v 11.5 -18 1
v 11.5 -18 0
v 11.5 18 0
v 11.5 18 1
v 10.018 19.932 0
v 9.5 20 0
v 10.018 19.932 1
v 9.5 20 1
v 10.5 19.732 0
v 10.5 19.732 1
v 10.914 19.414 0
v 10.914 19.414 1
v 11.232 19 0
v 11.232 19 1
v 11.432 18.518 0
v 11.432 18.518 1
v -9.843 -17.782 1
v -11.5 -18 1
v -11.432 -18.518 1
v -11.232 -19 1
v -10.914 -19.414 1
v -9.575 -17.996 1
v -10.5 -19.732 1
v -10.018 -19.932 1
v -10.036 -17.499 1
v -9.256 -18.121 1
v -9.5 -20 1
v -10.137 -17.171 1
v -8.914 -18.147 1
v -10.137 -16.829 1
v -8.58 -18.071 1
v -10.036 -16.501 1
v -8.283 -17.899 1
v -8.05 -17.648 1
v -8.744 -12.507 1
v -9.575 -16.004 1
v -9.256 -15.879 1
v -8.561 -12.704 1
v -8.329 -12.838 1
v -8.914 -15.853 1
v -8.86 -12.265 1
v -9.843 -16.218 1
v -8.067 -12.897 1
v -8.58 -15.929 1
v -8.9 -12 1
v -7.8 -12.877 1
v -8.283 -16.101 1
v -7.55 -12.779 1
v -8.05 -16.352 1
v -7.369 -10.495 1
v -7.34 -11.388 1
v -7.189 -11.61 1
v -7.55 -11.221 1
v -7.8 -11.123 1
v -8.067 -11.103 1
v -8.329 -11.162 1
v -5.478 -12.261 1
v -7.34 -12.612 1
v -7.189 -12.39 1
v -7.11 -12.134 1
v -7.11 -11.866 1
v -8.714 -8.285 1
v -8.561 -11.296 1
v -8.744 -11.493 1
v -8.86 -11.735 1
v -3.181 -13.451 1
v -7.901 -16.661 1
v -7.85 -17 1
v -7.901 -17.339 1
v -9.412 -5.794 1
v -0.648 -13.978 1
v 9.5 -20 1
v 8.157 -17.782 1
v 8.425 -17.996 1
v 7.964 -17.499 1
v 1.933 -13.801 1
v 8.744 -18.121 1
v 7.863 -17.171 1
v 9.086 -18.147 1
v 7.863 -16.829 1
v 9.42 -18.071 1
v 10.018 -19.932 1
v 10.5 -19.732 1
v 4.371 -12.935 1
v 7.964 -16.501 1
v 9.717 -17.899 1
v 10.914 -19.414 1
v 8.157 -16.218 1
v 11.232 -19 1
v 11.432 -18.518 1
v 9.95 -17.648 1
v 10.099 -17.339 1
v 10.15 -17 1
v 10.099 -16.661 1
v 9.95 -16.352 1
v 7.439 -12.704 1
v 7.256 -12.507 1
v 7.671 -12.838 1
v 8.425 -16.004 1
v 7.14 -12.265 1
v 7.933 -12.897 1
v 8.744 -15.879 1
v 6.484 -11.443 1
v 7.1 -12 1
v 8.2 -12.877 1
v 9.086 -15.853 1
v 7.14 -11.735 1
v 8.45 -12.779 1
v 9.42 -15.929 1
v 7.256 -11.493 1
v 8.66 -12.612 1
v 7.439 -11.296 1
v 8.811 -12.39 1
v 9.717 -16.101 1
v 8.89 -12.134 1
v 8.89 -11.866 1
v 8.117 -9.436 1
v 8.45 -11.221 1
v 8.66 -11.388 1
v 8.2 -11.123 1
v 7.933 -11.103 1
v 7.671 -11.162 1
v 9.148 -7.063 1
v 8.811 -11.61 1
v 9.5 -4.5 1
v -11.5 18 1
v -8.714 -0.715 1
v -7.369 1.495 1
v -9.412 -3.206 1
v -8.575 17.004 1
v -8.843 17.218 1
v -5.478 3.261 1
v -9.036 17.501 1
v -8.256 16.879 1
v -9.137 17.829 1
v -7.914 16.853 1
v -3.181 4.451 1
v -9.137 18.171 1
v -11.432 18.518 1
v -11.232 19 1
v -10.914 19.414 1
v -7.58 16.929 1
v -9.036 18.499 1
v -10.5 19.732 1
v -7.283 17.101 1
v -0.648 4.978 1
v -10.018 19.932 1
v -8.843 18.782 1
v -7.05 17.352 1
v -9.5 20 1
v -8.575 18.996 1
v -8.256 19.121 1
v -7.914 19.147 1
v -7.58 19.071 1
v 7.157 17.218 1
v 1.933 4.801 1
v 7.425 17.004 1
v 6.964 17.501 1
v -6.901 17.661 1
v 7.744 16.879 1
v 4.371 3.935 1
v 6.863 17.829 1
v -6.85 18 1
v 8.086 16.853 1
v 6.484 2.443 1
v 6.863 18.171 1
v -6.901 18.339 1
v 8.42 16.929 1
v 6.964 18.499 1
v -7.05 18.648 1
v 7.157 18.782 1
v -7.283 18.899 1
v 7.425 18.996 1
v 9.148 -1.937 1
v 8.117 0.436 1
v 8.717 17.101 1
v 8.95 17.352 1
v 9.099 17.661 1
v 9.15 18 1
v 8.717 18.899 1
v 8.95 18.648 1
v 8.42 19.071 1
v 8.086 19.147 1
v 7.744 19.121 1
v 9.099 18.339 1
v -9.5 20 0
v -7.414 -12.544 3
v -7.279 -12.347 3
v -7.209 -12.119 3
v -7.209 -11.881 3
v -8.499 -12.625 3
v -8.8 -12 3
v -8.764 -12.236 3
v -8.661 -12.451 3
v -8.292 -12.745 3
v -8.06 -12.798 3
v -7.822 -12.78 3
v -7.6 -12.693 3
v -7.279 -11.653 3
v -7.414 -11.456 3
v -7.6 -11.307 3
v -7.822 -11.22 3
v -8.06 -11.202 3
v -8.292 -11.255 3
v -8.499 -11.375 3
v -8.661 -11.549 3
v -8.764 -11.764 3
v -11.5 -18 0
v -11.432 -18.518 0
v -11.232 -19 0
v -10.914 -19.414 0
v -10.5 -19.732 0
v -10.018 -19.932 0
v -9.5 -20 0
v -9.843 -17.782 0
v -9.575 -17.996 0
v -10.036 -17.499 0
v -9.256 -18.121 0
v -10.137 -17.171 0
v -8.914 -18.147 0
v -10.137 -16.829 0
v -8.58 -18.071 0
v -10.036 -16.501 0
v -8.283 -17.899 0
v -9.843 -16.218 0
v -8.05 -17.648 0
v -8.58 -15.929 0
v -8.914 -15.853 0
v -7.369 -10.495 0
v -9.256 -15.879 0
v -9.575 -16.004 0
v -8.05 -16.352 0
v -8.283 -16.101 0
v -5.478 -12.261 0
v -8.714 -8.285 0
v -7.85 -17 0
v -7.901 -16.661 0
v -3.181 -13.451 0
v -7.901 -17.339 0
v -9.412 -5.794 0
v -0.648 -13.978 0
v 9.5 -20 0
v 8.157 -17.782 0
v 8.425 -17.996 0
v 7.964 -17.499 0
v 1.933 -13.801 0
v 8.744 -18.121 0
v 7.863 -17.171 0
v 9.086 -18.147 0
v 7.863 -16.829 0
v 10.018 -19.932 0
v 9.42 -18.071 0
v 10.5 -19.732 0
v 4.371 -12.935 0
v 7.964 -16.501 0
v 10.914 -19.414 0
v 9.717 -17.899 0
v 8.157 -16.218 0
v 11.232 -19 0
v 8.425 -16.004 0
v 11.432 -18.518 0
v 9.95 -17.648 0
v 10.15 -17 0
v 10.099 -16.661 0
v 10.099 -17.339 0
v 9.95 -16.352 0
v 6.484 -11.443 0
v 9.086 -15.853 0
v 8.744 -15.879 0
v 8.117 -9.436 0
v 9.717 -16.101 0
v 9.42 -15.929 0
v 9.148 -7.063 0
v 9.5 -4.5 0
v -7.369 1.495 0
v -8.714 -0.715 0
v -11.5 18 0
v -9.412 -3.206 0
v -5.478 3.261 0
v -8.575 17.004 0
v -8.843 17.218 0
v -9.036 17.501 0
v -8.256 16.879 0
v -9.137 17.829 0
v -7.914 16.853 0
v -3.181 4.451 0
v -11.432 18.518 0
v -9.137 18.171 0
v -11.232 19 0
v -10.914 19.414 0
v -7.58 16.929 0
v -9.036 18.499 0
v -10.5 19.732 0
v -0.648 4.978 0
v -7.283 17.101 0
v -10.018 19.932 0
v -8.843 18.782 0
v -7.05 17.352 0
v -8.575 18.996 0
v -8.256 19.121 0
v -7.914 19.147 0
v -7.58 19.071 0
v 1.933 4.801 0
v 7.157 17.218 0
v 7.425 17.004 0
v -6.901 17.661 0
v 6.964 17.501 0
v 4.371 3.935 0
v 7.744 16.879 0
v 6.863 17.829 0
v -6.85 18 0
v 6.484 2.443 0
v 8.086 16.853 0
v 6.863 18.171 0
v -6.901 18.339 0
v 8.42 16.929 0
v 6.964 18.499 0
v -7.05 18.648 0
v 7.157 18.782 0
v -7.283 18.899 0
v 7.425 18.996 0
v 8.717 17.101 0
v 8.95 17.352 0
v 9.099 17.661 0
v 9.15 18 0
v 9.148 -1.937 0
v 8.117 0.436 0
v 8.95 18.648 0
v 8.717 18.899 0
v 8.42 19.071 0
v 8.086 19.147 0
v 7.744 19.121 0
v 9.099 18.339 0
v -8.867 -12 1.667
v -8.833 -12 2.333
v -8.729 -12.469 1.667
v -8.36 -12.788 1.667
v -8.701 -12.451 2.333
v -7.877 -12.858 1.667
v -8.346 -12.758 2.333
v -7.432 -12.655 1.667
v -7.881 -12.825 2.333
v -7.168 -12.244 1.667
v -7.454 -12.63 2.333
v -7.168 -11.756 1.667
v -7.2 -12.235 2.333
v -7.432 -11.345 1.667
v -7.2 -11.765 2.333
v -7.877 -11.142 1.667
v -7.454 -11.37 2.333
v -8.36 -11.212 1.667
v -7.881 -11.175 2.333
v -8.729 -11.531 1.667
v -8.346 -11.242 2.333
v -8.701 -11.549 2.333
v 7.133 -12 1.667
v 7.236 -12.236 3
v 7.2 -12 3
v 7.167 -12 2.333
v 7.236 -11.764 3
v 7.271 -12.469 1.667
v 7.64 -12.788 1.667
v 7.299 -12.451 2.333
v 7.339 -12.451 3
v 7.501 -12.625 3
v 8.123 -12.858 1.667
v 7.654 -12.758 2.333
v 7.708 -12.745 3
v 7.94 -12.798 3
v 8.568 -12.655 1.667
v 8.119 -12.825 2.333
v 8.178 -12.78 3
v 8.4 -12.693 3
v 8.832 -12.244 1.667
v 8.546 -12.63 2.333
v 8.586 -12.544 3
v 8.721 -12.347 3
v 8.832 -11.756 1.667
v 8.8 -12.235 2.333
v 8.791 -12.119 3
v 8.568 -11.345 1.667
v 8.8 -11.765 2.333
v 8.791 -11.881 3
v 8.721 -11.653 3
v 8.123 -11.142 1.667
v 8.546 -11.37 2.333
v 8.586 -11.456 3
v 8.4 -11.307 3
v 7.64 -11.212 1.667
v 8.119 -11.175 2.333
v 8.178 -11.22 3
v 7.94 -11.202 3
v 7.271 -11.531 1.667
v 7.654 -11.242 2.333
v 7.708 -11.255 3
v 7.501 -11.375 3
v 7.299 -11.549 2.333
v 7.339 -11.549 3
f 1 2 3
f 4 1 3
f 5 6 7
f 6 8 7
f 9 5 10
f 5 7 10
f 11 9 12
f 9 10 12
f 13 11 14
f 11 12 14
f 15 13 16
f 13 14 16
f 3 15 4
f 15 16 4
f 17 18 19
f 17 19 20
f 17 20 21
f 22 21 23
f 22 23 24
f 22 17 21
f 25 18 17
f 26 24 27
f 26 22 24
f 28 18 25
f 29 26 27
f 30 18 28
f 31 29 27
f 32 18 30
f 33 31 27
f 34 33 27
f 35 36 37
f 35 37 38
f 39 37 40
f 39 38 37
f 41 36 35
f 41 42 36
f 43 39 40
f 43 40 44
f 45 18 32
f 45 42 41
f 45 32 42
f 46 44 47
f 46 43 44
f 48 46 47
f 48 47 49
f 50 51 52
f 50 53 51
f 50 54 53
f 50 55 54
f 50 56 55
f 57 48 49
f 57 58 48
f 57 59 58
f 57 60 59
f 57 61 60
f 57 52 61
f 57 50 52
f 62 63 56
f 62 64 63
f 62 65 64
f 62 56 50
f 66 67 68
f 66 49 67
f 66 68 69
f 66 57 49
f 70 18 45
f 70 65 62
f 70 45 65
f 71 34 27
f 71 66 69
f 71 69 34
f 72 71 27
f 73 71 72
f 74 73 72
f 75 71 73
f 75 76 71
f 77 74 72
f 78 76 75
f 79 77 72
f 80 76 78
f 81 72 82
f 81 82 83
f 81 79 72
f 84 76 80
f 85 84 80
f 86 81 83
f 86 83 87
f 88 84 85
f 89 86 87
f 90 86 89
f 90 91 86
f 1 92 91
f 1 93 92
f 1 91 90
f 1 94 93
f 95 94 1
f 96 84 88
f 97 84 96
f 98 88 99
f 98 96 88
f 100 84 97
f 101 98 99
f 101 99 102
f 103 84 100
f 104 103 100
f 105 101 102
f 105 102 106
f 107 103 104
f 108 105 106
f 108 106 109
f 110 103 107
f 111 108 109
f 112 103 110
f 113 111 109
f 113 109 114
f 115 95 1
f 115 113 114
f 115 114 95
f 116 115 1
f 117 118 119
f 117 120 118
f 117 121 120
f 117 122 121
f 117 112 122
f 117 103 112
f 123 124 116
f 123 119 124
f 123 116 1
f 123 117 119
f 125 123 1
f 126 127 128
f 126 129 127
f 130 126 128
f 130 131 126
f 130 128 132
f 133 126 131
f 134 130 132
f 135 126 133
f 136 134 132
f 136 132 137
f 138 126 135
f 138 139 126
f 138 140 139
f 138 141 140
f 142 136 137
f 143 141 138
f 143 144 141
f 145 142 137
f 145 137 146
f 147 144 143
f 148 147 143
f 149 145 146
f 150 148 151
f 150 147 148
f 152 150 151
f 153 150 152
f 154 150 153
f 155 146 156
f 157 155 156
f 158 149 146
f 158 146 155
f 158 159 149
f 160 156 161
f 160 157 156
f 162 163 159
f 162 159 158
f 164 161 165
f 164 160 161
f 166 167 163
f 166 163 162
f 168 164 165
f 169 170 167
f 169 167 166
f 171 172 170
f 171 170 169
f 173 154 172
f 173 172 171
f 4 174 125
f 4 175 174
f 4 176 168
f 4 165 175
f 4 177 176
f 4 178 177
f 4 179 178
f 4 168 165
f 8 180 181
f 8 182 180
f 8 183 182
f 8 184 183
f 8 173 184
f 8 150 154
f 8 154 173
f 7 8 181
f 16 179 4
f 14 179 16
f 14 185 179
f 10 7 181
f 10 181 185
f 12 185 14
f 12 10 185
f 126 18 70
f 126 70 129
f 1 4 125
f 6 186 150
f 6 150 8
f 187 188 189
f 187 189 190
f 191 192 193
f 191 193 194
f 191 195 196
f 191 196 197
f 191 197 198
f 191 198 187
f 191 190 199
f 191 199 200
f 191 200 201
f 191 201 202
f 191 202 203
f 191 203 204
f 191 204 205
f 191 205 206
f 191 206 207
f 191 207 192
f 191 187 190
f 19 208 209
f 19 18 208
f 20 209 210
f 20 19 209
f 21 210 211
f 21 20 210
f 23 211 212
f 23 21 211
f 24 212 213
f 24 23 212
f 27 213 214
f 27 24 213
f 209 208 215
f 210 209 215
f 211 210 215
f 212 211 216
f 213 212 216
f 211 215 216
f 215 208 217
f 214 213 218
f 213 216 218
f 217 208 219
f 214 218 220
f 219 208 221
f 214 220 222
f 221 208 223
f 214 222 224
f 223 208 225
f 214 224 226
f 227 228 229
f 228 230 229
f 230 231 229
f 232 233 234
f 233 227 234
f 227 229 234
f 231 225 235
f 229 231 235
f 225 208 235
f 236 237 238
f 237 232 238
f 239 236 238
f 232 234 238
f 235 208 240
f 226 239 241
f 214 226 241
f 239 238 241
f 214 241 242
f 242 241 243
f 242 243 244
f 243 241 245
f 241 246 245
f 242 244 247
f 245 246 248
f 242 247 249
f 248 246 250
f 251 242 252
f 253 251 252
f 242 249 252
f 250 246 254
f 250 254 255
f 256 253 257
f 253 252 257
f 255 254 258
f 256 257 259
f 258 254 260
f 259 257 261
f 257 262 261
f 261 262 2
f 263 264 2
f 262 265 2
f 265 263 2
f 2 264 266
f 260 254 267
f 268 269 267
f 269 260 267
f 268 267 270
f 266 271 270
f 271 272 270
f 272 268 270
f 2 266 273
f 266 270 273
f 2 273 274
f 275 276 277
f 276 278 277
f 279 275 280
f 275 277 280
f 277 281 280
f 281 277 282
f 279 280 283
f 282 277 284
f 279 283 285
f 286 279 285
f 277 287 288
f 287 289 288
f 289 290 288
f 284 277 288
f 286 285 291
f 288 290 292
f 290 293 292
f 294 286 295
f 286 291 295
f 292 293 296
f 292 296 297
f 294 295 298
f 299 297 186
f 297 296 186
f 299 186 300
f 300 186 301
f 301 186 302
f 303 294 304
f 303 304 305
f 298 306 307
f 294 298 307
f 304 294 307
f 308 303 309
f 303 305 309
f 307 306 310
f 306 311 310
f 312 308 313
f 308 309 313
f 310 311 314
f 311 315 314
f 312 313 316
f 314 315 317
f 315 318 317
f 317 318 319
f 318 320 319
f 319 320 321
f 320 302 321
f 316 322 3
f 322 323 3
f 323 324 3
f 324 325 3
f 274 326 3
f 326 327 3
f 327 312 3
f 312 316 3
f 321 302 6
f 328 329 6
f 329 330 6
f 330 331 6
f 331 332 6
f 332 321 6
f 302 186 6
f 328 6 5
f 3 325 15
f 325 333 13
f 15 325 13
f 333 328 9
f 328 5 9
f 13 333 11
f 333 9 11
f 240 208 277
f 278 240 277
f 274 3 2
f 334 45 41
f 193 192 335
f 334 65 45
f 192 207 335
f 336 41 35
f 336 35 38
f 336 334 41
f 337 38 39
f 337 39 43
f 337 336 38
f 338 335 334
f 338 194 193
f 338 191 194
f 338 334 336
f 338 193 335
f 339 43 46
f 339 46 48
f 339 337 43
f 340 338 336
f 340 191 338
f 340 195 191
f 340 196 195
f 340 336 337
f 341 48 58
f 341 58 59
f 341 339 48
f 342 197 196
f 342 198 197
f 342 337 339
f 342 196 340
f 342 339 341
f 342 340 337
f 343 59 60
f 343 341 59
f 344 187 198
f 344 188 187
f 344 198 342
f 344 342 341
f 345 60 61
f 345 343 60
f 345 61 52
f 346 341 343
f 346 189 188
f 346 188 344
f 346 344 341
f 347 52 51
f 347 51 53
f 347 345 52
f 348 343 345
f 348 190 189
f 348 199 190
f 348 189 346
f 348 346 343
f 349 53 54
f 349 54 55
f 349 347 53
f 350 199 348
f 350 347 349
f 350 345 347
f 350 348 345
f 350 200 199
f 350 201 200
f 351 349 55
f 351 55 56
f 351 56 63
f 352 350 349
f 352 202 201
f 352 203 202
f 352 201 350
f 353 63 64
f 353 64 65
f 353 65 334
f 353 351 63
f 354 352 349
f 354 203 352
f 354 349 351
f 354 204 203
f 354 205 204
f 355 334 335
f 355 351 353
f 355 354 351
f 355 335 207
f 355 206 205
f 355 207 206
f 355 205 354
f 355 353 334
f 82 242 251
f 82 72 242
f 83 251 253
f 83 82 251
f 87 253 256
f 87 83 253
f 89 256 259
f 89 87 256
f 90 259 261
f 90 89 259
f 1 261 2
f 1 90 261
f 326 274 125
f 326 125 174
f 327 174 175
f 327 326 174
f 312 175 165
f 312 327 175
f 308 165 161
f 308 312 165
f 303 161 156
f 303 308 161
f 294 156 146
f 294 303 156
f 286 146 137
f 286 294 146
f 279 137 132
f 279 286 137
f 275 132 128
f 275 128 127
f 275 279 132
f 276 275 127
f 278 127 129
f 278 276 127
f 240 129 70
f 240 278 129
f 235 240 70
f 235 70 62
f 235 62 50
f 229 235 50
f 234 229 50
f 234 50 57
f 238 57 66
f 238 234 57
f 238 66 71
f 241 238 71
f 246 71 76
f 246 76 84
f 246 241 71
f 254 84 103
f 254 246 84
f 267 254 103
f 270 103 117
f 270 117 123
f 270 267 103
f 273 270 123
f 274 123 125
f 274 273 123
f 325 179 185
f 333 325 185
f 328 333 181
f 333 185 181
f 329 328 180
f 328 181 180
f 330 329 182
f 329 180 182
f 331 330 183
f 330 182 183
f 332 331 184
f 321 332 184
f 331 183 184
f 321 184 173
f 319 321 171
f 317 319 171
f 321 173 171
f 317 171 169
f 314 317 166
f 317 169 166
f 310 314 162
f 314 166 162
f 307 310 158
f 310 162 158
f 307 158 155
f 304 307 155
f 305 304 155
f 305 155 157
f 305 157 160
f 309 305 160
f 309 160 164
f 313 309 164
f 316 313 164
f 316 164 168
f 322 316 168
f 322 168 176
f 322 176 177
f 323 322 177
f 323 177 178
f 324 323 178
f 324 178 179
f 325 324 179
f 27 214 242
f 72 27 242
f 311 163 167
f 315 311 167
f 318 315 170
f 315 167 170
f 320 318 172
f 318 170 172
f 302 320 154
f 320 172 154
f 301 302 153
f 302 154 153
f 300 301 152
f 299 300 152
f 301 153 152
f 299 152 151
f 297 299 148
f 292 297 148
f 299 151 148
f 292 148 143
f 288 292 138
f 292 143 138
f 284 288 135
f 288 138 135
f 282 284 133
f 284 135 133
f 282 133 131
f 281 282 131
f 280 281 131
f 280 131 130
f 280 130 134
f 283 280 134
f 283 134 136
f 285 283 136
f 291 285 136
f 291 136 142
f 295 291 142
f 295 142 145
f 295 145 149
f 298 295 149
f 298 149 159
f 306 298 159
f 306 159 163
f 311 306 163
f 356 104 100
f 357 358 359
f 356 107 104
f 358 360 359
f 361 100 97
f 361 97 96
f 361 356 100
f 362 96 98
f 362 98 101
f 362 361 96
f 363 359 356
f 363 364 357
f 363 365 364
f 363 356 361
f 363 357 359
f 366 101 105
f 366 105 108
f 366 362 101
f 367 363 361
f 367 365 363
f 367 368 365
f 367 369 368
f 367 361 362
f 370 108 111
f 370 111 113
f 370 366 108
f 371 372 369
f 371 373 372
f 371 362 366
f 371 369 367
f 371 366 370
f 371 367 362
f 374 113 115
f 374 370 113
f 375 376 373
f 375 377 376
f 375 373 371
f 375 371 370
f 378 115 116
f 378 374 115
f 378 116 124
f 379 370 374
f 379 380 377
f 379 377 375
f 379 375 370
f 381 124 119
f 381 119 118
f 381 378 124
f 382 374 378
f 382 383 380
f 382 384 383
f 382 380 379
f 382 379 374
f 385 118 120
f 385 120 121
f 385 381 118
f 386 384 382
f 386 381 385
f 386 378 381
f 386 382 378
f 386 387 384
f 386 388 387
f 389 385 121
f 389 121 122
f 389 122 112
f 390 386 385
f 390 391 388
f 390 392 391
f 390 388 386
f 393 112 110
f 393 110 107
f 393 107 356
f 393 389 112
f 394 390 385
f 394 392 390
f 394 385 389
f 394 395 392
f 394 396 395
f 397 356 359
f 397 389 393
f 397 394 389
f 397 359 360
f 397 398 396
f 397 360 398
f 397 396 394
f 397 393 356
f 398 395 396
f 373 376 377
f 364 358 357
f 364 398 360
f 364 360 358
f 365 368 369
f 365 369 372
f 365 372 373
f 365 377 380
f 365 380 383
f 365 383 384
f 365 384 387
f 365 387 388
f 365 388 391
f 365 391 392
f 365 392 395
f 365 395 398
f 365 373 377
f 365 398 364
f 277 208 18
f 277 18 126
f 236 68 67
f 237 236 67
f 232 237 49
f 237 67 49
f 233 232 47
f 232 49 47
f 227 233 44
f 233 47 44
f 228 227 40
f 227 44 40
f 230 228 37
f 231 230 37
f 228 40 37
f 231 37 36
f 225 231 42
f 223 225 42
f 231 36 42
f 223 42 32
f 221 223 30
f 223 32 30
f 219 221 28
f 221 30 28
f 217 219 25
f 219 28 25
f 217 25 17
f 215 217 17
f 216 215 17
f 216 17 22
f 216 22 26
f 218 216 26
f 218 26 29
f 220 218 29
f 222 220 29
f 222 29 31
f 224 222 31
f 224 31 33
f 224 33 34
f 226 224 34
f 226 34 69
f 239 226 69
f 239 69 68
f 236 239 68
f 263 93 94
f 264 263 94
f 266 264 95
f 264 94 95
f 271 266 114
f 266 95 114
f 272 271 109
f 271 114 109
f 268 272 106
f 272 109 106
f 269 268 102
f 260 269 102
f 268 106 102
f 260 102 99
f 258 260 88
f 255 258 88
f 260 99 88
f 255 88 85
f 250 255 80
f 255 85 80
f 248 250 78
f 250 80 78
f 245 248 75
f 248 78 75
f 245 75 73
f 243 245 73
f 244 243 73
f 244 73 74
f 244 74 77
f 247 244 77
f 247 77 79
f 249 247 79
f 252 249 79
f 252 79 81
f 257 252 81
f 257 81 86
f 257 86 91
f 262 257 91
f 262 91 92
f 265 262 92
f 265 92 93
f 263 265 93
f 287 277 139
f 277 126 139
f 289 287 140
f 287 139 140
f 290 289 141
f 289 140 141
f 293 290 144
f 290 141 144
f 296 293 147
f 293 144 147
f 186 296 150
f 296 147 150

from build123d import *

# Parameters (mm, degrees)
SKETCH_1_W          = 23
SKETCH_1_H          = 40
SKETCH_1_R          = 9.5
EXTRUDE_1_DEPTH     = 1
FILLET_1_R          = 2
SKETCH_3_R          = 1.15
CUT_EXTRUDE_1_DEPTH = 24.092206478
SKETCH_4_R          = 0.9
EXTRUDE_2_DEPTH     = 2
CHAMFER_1_SIZE      = 2
CHAMFER_1_SIZE_2    = 0.1


with BuildPart() as part:
    # 草图1 → 凸台-拉伸1 (new body)
    with BuildSketch(Plane.XY):
        Rectangle(SKETCH_1_W, SKETCH_1_H)
        with Locations((0, -4.5)):
            Circle(SKETCH_1_R, mode=Mode.SUBTRACT)
    extrude(amount=EXTRUDE_1_DEPTH)

    # 圆角1
    fillet_1_edges = [part.edges().sort_by_distance(p)[0] for p in [
        (11.5, -20, 0.5),
        (-11.5, -20, 0.5),
        (-11.5, 20, 0.5),
        (11.5, 20, 0.5),
    ]]
    fillet(fillet_1_edges, radius=FILLET_1_R)

    # 草图3 → 切除-拉伸1 (cut, through all)
    with BuildSketch(Plane.XY.offset(1)):
        with Locations((-8, 18)):
            Circle(SKETCH_3_R)
        with Locations((8, 18)):
            Circle(SKETCH_3_R)
        with Locations((-9, -17)):
            Circle(SKETCH_3_R)
        with Locations((9, -17)):
            Circle(SKETCH_3_R)
    extrude(amount=-CUT_EXTRUDE_1_DEPTH, mode=Mode.SUBTRACT)

    # 草图4 → 凸台-拉伸2 (add)
    with BuildSketch(Plane.XY.offset(1)):
        with Locations(Location((-8, -12, 0), (0, 0, 180))):
            Circle(SKETCH_4_R)
        with Locations(Location((8, -12, 0), (0, 0, 180))):
            Circle(SKETCH_4_R)
    extrude(amount=EXTRUDE_2_DEPTH)

    # 倒角1
    # the kernel refuses this chamfer: 2, 0.1 mm, written as the material it takes off along each edge
    with BuildSketch(Plane(origin=(-8, -12, 3), x_dir=(-1, 0, 0), z_dir=(0, 1, 0))) as chamfer_1_piece_1_section:
        Polygon((0.9, -CHAMFER_1_SIZE), (0.9 - CHAMFER_1_SIZE_2, 0), (0.9, 0), align=None)
    chamfer_1_piece_1 = revolve(axis=Axis((-8, -12, 3), (0, 0, 1)), mode=Mode.PRIVATE)
    chamfer_1_piece_1 = split(chamfer_1_piece_1, bisect_by=Plane(origin=(-7.141866516, -12, 1), z_dir=(0, 0, 1)), keep=Keep.TOP, mode=Mode.PRIVATE)
    add(chamfer_1_piece_1, mode=Mode.SUBTRACT)
    with BuildSketch(Plane(origin=(8, -12, 3), x_dir=(-1, 0, 0), z_dir=(0, 1, 0))) as chamfer_1_piece_2_section:
        Polygon((0.9, -CHAMFER_1_SIZE), (0.9 - CHAMFER_1_SIZE_2, 0), (0.9, 0), align=None)
    chamfer_1_piece_2 = revolve(axis=Axis((8, -12, 3), (0, 0, 1)), mode=Mode.PRIVATE)
    chamfer_1_piece_2 = split(chamfer_1_piece_2, bisect_by=Plane(origin=(8.858133484, -12, 1), z_dir=(0, 0, 1)), keep=Keep.TOP, mode=Mode.PRIVATE)
    add(chamfer_1_piece_2, mode=Mode.SUBTRACT)


solid = part.part
